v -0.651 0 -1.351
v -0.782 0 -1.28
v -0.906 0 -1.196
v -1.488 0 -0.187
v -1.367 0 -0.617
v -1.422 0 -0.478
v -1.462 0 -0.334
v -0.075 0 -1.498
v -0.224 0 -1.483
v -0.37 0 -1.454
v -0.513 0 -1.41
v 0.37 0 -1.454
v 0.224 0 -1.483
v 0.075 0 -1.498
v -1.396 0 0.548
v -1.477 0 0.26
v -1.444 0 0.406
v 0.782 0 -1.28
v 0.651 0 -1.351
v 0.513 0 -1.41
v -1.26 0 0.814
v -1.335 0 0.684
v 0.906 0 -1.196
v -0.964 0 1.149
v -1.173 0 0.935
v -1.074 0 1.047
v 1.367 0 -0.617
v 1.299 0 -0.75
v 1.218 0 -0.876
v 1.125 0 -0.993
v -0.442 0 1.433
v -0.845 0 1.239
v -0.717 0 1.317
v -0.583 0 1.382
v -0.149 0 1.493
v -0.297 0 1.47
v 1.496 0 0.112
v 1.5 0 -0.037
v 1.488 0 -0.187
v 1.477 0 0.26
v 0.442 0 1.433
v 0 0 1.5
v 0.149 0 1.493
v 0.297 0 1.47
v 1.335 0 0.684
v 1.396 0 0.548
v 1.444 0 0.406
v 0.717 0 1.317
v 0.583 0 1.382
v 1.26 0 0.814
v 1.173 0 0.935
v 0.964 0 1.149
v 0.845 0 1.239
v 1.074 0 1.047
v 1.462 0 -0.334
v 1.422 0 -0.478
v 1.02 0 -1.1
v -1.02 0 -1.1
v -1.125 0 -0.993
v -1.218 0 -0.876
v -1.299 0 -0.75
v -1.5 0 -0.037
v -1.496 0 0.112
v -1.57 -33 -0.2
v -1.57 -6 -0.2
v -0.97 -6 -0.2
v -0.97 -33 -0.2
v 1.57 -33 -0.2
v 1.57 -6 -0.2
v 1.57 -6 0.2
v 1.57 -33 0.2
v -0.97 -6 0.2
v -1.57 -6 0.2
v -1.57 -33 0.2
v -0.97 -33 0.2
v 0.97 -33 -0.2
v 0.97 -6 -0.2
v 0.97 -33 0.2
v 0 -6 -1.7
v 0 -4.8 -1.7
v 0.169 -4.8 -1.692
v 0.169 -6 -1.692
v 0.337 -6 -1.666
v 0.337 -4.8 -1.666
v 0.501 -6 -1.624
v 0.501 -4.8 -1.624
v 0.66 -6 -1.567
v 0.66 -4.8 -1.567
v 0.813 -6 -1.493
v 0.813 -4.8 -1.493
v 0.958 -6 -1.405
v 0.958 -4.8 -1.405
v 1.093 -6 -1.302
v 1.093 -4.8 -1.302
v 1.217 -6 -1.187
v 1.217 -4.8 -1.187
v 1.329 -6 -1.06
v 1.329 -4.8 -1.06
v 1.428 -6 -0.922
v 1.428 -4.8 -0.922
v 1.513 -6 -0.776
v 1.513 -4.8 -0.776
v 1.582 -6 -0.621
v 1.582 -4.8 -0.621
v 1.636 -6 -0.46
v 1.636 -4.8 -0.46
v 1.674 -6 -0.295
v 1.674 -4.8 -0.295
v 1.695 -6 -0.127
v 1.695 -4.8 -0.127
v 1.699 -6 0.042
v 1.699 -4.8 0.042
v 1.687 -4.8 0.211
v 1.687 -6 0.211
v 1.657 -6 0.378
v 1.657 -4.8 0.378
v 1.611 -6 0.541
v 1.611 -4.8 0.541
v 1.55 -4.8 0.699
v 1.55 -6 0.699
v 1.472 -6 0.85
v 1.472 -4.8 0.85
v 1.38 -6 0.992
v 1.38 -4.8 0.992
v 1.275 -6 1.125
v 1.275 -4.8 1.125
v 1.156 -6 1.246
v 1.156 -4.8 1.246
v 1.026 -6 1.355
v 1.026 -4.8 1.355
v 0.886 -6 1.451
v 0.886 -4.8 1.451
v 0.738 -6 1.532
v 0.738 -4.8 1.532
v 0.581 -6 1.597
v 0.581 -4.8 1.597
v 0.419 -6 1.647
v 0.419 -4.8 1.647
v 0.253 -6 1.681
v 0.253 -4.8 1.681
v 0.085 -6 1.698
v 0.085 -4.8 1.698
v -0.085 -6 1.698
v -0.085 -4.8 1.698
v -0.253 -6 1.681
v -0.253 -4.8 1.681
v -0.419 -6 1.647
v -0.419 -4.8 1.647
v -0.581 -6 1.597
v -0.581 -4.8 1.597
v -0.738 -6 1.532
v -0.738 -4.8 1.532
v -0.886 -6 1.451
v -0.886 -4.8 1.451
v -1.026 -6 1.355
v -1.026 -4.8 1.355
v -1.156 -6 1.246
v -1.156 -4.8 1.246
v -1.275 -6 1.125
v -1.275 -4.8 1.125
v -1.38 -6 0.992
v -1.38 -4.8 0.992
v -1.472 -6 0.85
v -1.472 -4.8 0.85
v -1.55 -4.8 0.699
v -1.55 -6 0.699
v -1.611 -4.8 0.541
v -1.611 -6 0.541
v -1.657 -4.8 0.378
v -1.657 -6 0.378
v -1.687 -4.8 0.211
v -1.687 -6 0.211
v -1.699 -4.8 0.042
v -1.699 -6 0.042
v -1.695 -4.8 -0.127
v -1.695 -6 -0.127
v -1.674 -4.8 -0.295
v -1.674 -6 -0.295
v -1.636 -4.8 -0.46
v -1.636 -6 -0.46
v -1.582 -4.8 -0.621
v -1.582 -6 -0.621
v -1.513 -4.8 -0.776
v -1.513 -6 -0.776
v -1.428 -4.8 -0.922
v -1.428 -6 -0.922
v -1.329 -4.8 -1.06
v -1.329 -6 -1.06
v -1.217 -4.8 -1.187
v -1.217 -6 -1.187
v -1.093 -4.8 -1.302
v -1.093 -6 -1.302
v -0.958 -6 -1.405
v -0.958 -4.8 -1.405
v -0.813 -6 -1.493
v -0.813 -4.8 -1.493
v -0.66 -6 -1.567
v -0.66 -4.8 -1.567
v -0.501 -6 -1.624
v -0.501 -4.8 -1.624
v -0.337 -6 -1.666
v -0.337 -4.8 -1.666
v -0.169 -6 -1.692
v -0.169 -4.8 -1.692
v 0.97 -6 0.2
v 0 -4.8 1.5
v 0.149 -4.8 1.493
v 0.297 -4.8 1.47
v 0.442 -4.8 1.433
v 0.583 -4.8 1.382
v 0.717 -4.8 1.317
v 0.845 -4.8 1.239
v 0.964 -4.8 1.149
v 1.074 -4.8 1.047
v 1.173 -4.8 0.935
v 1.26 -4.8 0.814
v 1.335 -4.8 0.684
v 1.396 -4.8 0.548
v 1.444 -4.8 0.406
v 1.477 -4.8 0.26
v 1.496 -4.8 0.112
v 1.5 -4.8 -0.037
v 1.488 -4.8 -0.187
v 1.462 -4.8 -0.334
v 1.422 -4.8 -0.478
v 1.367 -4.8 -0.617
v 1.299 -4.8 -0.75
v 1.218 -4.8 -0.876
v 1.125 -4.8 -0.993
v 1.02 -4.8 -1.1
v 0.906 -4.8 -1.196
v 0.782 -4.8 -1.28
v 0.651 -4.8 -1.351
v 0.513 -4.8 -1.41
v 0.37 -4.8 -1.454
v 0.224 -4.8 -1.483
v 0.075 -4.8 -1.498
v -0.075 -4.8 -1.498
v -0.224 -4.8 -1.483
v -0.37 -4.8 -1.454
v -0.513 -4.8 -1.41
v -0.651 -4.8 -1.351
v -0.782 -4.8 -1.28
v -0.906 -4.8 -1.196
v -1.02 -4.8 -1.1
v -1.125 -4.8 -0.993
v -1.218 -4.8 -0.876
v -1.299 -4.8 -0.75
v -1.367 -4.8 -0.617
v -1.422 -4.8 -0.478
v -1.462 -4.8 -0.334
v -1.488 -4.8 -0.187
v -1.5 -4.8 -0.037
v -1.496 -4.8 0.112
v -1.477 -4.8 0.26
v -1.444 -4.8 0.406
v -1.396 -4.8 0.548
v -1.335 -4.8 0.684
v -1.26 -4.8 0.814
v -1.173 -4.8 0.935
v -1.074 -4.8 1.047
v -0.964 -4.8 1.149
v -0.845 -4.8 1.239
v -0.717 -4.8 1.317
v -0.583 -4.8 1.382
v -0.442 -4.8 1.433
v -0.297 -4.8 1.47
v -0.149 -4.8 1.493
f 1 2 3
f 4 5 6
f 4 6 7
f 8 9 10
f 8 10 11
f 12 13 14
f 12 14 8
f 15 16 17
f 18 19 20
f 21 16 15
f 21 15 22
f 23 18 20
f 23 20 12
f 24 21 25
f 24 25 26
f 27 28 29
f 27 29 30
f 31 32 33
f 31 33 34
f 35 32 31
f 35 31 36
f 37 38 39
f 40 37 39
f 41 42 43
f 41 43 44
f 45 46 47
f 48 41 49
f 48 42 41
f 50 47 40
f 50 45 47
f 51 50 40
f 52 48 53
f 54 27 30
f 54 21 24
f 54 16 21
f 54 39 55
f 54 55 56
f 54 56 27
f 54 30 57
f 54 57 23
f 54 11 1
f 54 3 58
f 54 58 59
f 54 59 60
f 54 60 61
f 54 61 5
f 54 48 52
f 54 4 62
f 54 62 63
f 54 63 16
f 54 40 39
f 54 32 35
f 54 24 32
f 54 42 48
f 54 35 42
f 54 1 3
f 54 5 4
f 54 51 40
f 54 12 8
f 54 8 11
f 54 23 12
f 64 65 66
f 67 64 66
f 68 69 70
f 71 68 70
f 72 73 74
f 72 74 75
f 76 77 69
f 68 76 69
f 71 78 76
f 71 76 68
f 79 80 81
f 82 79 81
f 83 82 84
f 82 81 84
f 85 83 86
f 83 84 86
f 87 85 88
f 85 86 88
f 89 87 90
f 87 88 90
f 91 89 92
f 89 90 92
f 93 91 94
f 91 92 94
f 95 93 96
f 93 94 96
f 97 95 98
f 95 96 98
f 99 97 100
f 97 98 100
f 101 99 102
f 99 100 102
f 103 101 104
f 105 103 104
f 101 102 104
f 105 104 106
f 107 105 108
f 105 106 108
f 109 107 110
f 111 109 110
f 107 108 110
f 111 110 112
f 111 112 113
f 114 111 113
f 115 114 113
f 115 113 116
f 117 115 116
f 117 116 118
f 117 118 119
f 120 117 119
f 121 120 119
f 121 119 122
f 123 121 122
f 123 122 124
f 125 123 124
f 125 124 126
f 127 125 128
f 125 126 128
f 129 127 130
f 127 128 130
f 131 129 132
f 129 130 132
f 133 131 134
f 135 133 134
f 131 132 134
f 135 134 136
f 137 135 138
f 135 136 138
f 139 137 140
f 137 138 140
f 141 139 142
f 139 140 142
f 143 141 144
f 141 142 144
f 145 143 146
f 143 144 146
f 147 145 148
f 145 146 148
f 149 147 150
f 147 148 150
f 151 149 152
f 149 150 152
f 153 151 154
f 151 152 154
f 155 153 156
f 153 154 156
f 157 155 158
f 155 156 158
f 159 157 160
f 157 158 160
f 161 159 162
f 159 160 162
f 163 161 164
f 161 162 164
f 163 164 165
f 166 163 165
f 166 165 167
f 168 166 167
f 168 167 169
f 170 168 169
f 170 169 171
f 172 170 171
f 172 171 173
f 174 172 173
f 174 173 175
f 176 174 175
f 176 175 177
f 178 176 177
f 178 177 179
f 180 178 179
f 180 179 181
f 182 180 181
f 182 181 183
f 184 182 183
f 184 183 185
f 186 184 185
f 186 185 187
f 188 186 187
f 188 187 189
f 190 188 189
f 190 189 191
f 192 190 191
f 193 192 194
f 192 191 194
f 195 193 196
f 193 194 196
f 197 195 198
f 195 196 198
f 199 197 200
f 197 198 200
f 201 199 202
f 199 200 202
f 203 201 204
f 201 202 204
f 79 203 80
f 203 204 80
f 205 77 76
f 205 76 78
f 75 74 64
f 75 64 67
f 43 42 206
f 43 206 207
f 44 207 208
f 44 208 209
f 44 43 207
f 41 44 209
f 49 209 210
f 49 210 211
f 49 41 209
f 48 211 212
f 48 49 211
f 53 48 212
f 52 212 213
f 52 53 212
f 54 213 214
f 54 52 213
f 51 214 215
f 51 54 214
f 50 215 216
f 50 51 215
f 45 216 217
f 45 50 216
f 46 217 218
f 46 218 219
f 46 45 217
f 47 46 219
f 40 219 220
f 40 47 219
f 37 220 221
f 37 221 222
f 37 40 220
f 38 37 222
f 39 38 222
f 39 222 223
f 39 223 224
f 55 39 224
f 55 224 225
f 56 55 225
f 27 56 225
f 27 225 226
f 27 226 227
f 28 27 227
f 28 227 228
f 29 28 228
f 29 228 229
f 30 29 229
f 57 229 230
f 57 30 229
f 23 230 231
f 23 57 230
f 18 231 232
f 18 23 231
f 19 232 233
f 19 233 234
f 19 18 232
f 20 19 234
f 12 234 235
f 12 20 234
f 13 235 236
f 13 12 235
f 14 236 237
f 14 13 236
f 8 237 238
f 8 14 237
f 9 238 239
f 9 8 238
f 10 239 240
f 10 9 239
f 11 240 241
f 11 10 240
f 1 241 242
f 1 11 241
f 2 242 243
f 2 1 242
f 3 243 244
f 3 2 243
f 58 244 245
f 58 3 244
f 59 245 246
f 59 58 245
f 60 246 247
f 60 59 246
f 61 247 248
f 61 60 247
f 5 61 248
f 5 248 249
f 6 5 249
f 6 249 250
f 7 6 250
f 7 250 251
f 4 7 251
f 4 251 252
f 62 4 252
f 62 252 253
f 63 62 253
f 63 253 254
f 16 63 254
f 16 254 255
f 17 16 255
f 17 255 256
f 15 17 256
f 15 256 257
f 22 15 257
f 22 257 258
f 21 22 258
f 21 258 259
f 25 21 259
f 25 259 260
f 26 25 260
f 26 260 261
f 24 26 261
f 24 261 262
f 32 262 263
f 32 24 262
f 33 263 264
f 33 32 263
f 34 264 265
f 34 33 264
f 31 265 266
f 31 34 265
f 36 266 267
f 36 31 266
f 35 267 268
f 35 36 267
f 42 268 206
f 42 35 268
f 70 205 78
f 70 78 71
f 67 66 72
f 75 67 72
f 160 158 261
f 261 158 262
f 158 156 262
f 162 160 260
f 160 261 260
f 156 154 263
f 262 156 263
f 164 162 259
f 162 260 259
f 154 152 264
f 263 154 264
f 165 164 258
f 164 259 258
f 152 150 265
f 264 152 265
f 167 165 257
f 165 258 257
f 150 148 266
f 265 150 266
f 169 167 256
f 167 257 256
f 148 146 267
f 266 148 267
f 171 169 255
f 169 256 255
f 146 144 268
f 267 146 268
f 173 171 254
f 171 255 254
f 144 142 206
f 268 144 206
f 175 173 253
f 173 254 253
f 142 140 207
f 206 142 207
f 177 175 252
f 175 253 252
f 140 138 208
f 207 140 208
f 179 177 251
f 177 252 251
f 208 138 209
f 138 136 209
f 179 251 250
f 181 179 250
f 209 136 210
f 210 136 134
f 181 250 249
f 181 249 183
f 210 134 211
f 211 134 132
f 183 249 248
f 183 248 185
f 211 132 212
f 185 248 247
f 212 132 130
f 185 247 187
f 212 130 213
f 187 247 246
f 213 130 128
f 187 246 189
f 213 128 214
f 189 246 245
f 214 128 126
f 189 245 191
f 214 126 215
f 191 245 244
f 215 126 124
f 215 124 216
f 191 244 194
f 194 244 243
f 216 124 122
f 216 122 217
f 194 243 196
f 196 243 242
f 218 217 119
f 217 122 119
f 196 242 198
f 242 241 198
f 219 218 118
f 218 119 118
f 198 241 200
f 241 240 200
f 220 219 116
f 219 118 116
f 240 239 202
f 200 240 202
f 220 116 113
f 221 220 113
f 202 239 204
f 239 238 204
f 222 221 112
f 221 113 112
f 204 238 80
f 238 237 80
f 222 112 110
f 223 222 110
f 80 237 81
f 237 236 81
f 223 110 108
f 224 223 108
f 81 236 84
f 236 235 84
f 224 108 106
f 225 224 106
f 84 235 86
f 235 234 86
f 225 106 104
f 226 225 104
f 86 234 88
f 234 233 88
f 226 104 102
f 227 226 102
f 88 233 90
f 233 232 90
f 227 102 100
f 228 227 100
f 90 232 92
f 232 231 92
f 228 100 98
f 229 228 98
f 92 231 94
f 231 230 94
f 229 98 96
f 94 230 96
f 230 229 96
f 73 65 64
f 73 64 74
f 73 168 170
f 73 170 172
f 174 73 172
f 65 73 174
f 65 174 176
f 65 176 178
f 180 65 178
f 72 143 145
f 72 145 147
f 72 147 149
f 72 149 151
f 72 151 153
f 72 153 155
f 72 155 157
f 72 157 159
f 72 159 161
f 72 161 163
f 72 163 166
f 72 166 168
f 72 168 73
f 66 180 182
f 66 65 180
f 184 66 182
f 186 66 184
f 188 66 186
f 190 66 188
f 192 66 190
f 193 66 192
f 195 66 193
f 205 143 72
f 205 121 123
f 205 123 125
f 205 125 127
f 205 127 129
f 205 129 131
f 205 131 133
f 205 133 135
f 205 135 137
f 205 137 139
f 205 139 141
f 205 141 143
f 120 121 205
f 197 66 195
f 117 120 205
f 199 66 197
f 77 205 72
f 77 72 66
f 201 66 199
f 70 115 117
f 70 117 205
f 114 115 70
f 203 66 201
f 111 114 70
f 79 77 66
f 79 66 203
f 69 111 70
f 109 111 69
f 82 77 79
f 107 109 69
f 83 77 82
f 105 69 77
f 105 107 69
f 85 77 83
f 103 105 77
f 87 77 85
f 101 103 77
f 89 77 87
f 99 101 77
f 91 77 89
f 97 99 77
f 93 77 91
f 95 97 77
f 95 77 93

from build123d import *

# Parameters (mm, degrees)
SKETCH1_R           = 1.5
BOSS_EXTRUDE1_DEPTH = 4.8
SKETCH2_R           = 1.7
BOSS_EXTRUDE2_DEPTH = 1.2
SKETCH3_W           = 0.6
SKETCH3_H           = 0.4
BOSS_EXTRUDE3_DEPTH = 27


with BuildPart() as part:
    # Sketch1 → Boss-Extrude1 (new body)
    with BuildSketch(Plane(origin=(0, 0, 0), x_dir=(1, 0, 0), z_dir=(0, 1, 0))):
        with Locations(Location((0, 0, 0), (0, 0, 270))):
            Circle(SKETCH1_R)
    extrude(amount=-BOSS_EXTRUDE1_DEPTH)

    # Sketch2 → Boss-Extrude2 (add)
    with BuildSketch(Plane.XZ.offset(4.8)):
        with Locations(Location((0, 0, 0), (0, 0, 270))):
            Circle(SKETCH2_R)
    extrude(amount=BOSS_EXTRUDE2_DEPTH)

    # Sketch3 → Boss-Extrude3 (add)
    with BuildSketch(Plane.XZ.offset(6)):
        with Locations((-1.27, 0)):
            Rectangle(SKETCH3_W, SKETCH3_H)
        with Locations((1.27, 0)):
            Rectangle(SKETCH3_W, SKETCH3_H)
    extrude(amount=BOSS_EXTRUDE3_DEPTH)


solid = part.part
